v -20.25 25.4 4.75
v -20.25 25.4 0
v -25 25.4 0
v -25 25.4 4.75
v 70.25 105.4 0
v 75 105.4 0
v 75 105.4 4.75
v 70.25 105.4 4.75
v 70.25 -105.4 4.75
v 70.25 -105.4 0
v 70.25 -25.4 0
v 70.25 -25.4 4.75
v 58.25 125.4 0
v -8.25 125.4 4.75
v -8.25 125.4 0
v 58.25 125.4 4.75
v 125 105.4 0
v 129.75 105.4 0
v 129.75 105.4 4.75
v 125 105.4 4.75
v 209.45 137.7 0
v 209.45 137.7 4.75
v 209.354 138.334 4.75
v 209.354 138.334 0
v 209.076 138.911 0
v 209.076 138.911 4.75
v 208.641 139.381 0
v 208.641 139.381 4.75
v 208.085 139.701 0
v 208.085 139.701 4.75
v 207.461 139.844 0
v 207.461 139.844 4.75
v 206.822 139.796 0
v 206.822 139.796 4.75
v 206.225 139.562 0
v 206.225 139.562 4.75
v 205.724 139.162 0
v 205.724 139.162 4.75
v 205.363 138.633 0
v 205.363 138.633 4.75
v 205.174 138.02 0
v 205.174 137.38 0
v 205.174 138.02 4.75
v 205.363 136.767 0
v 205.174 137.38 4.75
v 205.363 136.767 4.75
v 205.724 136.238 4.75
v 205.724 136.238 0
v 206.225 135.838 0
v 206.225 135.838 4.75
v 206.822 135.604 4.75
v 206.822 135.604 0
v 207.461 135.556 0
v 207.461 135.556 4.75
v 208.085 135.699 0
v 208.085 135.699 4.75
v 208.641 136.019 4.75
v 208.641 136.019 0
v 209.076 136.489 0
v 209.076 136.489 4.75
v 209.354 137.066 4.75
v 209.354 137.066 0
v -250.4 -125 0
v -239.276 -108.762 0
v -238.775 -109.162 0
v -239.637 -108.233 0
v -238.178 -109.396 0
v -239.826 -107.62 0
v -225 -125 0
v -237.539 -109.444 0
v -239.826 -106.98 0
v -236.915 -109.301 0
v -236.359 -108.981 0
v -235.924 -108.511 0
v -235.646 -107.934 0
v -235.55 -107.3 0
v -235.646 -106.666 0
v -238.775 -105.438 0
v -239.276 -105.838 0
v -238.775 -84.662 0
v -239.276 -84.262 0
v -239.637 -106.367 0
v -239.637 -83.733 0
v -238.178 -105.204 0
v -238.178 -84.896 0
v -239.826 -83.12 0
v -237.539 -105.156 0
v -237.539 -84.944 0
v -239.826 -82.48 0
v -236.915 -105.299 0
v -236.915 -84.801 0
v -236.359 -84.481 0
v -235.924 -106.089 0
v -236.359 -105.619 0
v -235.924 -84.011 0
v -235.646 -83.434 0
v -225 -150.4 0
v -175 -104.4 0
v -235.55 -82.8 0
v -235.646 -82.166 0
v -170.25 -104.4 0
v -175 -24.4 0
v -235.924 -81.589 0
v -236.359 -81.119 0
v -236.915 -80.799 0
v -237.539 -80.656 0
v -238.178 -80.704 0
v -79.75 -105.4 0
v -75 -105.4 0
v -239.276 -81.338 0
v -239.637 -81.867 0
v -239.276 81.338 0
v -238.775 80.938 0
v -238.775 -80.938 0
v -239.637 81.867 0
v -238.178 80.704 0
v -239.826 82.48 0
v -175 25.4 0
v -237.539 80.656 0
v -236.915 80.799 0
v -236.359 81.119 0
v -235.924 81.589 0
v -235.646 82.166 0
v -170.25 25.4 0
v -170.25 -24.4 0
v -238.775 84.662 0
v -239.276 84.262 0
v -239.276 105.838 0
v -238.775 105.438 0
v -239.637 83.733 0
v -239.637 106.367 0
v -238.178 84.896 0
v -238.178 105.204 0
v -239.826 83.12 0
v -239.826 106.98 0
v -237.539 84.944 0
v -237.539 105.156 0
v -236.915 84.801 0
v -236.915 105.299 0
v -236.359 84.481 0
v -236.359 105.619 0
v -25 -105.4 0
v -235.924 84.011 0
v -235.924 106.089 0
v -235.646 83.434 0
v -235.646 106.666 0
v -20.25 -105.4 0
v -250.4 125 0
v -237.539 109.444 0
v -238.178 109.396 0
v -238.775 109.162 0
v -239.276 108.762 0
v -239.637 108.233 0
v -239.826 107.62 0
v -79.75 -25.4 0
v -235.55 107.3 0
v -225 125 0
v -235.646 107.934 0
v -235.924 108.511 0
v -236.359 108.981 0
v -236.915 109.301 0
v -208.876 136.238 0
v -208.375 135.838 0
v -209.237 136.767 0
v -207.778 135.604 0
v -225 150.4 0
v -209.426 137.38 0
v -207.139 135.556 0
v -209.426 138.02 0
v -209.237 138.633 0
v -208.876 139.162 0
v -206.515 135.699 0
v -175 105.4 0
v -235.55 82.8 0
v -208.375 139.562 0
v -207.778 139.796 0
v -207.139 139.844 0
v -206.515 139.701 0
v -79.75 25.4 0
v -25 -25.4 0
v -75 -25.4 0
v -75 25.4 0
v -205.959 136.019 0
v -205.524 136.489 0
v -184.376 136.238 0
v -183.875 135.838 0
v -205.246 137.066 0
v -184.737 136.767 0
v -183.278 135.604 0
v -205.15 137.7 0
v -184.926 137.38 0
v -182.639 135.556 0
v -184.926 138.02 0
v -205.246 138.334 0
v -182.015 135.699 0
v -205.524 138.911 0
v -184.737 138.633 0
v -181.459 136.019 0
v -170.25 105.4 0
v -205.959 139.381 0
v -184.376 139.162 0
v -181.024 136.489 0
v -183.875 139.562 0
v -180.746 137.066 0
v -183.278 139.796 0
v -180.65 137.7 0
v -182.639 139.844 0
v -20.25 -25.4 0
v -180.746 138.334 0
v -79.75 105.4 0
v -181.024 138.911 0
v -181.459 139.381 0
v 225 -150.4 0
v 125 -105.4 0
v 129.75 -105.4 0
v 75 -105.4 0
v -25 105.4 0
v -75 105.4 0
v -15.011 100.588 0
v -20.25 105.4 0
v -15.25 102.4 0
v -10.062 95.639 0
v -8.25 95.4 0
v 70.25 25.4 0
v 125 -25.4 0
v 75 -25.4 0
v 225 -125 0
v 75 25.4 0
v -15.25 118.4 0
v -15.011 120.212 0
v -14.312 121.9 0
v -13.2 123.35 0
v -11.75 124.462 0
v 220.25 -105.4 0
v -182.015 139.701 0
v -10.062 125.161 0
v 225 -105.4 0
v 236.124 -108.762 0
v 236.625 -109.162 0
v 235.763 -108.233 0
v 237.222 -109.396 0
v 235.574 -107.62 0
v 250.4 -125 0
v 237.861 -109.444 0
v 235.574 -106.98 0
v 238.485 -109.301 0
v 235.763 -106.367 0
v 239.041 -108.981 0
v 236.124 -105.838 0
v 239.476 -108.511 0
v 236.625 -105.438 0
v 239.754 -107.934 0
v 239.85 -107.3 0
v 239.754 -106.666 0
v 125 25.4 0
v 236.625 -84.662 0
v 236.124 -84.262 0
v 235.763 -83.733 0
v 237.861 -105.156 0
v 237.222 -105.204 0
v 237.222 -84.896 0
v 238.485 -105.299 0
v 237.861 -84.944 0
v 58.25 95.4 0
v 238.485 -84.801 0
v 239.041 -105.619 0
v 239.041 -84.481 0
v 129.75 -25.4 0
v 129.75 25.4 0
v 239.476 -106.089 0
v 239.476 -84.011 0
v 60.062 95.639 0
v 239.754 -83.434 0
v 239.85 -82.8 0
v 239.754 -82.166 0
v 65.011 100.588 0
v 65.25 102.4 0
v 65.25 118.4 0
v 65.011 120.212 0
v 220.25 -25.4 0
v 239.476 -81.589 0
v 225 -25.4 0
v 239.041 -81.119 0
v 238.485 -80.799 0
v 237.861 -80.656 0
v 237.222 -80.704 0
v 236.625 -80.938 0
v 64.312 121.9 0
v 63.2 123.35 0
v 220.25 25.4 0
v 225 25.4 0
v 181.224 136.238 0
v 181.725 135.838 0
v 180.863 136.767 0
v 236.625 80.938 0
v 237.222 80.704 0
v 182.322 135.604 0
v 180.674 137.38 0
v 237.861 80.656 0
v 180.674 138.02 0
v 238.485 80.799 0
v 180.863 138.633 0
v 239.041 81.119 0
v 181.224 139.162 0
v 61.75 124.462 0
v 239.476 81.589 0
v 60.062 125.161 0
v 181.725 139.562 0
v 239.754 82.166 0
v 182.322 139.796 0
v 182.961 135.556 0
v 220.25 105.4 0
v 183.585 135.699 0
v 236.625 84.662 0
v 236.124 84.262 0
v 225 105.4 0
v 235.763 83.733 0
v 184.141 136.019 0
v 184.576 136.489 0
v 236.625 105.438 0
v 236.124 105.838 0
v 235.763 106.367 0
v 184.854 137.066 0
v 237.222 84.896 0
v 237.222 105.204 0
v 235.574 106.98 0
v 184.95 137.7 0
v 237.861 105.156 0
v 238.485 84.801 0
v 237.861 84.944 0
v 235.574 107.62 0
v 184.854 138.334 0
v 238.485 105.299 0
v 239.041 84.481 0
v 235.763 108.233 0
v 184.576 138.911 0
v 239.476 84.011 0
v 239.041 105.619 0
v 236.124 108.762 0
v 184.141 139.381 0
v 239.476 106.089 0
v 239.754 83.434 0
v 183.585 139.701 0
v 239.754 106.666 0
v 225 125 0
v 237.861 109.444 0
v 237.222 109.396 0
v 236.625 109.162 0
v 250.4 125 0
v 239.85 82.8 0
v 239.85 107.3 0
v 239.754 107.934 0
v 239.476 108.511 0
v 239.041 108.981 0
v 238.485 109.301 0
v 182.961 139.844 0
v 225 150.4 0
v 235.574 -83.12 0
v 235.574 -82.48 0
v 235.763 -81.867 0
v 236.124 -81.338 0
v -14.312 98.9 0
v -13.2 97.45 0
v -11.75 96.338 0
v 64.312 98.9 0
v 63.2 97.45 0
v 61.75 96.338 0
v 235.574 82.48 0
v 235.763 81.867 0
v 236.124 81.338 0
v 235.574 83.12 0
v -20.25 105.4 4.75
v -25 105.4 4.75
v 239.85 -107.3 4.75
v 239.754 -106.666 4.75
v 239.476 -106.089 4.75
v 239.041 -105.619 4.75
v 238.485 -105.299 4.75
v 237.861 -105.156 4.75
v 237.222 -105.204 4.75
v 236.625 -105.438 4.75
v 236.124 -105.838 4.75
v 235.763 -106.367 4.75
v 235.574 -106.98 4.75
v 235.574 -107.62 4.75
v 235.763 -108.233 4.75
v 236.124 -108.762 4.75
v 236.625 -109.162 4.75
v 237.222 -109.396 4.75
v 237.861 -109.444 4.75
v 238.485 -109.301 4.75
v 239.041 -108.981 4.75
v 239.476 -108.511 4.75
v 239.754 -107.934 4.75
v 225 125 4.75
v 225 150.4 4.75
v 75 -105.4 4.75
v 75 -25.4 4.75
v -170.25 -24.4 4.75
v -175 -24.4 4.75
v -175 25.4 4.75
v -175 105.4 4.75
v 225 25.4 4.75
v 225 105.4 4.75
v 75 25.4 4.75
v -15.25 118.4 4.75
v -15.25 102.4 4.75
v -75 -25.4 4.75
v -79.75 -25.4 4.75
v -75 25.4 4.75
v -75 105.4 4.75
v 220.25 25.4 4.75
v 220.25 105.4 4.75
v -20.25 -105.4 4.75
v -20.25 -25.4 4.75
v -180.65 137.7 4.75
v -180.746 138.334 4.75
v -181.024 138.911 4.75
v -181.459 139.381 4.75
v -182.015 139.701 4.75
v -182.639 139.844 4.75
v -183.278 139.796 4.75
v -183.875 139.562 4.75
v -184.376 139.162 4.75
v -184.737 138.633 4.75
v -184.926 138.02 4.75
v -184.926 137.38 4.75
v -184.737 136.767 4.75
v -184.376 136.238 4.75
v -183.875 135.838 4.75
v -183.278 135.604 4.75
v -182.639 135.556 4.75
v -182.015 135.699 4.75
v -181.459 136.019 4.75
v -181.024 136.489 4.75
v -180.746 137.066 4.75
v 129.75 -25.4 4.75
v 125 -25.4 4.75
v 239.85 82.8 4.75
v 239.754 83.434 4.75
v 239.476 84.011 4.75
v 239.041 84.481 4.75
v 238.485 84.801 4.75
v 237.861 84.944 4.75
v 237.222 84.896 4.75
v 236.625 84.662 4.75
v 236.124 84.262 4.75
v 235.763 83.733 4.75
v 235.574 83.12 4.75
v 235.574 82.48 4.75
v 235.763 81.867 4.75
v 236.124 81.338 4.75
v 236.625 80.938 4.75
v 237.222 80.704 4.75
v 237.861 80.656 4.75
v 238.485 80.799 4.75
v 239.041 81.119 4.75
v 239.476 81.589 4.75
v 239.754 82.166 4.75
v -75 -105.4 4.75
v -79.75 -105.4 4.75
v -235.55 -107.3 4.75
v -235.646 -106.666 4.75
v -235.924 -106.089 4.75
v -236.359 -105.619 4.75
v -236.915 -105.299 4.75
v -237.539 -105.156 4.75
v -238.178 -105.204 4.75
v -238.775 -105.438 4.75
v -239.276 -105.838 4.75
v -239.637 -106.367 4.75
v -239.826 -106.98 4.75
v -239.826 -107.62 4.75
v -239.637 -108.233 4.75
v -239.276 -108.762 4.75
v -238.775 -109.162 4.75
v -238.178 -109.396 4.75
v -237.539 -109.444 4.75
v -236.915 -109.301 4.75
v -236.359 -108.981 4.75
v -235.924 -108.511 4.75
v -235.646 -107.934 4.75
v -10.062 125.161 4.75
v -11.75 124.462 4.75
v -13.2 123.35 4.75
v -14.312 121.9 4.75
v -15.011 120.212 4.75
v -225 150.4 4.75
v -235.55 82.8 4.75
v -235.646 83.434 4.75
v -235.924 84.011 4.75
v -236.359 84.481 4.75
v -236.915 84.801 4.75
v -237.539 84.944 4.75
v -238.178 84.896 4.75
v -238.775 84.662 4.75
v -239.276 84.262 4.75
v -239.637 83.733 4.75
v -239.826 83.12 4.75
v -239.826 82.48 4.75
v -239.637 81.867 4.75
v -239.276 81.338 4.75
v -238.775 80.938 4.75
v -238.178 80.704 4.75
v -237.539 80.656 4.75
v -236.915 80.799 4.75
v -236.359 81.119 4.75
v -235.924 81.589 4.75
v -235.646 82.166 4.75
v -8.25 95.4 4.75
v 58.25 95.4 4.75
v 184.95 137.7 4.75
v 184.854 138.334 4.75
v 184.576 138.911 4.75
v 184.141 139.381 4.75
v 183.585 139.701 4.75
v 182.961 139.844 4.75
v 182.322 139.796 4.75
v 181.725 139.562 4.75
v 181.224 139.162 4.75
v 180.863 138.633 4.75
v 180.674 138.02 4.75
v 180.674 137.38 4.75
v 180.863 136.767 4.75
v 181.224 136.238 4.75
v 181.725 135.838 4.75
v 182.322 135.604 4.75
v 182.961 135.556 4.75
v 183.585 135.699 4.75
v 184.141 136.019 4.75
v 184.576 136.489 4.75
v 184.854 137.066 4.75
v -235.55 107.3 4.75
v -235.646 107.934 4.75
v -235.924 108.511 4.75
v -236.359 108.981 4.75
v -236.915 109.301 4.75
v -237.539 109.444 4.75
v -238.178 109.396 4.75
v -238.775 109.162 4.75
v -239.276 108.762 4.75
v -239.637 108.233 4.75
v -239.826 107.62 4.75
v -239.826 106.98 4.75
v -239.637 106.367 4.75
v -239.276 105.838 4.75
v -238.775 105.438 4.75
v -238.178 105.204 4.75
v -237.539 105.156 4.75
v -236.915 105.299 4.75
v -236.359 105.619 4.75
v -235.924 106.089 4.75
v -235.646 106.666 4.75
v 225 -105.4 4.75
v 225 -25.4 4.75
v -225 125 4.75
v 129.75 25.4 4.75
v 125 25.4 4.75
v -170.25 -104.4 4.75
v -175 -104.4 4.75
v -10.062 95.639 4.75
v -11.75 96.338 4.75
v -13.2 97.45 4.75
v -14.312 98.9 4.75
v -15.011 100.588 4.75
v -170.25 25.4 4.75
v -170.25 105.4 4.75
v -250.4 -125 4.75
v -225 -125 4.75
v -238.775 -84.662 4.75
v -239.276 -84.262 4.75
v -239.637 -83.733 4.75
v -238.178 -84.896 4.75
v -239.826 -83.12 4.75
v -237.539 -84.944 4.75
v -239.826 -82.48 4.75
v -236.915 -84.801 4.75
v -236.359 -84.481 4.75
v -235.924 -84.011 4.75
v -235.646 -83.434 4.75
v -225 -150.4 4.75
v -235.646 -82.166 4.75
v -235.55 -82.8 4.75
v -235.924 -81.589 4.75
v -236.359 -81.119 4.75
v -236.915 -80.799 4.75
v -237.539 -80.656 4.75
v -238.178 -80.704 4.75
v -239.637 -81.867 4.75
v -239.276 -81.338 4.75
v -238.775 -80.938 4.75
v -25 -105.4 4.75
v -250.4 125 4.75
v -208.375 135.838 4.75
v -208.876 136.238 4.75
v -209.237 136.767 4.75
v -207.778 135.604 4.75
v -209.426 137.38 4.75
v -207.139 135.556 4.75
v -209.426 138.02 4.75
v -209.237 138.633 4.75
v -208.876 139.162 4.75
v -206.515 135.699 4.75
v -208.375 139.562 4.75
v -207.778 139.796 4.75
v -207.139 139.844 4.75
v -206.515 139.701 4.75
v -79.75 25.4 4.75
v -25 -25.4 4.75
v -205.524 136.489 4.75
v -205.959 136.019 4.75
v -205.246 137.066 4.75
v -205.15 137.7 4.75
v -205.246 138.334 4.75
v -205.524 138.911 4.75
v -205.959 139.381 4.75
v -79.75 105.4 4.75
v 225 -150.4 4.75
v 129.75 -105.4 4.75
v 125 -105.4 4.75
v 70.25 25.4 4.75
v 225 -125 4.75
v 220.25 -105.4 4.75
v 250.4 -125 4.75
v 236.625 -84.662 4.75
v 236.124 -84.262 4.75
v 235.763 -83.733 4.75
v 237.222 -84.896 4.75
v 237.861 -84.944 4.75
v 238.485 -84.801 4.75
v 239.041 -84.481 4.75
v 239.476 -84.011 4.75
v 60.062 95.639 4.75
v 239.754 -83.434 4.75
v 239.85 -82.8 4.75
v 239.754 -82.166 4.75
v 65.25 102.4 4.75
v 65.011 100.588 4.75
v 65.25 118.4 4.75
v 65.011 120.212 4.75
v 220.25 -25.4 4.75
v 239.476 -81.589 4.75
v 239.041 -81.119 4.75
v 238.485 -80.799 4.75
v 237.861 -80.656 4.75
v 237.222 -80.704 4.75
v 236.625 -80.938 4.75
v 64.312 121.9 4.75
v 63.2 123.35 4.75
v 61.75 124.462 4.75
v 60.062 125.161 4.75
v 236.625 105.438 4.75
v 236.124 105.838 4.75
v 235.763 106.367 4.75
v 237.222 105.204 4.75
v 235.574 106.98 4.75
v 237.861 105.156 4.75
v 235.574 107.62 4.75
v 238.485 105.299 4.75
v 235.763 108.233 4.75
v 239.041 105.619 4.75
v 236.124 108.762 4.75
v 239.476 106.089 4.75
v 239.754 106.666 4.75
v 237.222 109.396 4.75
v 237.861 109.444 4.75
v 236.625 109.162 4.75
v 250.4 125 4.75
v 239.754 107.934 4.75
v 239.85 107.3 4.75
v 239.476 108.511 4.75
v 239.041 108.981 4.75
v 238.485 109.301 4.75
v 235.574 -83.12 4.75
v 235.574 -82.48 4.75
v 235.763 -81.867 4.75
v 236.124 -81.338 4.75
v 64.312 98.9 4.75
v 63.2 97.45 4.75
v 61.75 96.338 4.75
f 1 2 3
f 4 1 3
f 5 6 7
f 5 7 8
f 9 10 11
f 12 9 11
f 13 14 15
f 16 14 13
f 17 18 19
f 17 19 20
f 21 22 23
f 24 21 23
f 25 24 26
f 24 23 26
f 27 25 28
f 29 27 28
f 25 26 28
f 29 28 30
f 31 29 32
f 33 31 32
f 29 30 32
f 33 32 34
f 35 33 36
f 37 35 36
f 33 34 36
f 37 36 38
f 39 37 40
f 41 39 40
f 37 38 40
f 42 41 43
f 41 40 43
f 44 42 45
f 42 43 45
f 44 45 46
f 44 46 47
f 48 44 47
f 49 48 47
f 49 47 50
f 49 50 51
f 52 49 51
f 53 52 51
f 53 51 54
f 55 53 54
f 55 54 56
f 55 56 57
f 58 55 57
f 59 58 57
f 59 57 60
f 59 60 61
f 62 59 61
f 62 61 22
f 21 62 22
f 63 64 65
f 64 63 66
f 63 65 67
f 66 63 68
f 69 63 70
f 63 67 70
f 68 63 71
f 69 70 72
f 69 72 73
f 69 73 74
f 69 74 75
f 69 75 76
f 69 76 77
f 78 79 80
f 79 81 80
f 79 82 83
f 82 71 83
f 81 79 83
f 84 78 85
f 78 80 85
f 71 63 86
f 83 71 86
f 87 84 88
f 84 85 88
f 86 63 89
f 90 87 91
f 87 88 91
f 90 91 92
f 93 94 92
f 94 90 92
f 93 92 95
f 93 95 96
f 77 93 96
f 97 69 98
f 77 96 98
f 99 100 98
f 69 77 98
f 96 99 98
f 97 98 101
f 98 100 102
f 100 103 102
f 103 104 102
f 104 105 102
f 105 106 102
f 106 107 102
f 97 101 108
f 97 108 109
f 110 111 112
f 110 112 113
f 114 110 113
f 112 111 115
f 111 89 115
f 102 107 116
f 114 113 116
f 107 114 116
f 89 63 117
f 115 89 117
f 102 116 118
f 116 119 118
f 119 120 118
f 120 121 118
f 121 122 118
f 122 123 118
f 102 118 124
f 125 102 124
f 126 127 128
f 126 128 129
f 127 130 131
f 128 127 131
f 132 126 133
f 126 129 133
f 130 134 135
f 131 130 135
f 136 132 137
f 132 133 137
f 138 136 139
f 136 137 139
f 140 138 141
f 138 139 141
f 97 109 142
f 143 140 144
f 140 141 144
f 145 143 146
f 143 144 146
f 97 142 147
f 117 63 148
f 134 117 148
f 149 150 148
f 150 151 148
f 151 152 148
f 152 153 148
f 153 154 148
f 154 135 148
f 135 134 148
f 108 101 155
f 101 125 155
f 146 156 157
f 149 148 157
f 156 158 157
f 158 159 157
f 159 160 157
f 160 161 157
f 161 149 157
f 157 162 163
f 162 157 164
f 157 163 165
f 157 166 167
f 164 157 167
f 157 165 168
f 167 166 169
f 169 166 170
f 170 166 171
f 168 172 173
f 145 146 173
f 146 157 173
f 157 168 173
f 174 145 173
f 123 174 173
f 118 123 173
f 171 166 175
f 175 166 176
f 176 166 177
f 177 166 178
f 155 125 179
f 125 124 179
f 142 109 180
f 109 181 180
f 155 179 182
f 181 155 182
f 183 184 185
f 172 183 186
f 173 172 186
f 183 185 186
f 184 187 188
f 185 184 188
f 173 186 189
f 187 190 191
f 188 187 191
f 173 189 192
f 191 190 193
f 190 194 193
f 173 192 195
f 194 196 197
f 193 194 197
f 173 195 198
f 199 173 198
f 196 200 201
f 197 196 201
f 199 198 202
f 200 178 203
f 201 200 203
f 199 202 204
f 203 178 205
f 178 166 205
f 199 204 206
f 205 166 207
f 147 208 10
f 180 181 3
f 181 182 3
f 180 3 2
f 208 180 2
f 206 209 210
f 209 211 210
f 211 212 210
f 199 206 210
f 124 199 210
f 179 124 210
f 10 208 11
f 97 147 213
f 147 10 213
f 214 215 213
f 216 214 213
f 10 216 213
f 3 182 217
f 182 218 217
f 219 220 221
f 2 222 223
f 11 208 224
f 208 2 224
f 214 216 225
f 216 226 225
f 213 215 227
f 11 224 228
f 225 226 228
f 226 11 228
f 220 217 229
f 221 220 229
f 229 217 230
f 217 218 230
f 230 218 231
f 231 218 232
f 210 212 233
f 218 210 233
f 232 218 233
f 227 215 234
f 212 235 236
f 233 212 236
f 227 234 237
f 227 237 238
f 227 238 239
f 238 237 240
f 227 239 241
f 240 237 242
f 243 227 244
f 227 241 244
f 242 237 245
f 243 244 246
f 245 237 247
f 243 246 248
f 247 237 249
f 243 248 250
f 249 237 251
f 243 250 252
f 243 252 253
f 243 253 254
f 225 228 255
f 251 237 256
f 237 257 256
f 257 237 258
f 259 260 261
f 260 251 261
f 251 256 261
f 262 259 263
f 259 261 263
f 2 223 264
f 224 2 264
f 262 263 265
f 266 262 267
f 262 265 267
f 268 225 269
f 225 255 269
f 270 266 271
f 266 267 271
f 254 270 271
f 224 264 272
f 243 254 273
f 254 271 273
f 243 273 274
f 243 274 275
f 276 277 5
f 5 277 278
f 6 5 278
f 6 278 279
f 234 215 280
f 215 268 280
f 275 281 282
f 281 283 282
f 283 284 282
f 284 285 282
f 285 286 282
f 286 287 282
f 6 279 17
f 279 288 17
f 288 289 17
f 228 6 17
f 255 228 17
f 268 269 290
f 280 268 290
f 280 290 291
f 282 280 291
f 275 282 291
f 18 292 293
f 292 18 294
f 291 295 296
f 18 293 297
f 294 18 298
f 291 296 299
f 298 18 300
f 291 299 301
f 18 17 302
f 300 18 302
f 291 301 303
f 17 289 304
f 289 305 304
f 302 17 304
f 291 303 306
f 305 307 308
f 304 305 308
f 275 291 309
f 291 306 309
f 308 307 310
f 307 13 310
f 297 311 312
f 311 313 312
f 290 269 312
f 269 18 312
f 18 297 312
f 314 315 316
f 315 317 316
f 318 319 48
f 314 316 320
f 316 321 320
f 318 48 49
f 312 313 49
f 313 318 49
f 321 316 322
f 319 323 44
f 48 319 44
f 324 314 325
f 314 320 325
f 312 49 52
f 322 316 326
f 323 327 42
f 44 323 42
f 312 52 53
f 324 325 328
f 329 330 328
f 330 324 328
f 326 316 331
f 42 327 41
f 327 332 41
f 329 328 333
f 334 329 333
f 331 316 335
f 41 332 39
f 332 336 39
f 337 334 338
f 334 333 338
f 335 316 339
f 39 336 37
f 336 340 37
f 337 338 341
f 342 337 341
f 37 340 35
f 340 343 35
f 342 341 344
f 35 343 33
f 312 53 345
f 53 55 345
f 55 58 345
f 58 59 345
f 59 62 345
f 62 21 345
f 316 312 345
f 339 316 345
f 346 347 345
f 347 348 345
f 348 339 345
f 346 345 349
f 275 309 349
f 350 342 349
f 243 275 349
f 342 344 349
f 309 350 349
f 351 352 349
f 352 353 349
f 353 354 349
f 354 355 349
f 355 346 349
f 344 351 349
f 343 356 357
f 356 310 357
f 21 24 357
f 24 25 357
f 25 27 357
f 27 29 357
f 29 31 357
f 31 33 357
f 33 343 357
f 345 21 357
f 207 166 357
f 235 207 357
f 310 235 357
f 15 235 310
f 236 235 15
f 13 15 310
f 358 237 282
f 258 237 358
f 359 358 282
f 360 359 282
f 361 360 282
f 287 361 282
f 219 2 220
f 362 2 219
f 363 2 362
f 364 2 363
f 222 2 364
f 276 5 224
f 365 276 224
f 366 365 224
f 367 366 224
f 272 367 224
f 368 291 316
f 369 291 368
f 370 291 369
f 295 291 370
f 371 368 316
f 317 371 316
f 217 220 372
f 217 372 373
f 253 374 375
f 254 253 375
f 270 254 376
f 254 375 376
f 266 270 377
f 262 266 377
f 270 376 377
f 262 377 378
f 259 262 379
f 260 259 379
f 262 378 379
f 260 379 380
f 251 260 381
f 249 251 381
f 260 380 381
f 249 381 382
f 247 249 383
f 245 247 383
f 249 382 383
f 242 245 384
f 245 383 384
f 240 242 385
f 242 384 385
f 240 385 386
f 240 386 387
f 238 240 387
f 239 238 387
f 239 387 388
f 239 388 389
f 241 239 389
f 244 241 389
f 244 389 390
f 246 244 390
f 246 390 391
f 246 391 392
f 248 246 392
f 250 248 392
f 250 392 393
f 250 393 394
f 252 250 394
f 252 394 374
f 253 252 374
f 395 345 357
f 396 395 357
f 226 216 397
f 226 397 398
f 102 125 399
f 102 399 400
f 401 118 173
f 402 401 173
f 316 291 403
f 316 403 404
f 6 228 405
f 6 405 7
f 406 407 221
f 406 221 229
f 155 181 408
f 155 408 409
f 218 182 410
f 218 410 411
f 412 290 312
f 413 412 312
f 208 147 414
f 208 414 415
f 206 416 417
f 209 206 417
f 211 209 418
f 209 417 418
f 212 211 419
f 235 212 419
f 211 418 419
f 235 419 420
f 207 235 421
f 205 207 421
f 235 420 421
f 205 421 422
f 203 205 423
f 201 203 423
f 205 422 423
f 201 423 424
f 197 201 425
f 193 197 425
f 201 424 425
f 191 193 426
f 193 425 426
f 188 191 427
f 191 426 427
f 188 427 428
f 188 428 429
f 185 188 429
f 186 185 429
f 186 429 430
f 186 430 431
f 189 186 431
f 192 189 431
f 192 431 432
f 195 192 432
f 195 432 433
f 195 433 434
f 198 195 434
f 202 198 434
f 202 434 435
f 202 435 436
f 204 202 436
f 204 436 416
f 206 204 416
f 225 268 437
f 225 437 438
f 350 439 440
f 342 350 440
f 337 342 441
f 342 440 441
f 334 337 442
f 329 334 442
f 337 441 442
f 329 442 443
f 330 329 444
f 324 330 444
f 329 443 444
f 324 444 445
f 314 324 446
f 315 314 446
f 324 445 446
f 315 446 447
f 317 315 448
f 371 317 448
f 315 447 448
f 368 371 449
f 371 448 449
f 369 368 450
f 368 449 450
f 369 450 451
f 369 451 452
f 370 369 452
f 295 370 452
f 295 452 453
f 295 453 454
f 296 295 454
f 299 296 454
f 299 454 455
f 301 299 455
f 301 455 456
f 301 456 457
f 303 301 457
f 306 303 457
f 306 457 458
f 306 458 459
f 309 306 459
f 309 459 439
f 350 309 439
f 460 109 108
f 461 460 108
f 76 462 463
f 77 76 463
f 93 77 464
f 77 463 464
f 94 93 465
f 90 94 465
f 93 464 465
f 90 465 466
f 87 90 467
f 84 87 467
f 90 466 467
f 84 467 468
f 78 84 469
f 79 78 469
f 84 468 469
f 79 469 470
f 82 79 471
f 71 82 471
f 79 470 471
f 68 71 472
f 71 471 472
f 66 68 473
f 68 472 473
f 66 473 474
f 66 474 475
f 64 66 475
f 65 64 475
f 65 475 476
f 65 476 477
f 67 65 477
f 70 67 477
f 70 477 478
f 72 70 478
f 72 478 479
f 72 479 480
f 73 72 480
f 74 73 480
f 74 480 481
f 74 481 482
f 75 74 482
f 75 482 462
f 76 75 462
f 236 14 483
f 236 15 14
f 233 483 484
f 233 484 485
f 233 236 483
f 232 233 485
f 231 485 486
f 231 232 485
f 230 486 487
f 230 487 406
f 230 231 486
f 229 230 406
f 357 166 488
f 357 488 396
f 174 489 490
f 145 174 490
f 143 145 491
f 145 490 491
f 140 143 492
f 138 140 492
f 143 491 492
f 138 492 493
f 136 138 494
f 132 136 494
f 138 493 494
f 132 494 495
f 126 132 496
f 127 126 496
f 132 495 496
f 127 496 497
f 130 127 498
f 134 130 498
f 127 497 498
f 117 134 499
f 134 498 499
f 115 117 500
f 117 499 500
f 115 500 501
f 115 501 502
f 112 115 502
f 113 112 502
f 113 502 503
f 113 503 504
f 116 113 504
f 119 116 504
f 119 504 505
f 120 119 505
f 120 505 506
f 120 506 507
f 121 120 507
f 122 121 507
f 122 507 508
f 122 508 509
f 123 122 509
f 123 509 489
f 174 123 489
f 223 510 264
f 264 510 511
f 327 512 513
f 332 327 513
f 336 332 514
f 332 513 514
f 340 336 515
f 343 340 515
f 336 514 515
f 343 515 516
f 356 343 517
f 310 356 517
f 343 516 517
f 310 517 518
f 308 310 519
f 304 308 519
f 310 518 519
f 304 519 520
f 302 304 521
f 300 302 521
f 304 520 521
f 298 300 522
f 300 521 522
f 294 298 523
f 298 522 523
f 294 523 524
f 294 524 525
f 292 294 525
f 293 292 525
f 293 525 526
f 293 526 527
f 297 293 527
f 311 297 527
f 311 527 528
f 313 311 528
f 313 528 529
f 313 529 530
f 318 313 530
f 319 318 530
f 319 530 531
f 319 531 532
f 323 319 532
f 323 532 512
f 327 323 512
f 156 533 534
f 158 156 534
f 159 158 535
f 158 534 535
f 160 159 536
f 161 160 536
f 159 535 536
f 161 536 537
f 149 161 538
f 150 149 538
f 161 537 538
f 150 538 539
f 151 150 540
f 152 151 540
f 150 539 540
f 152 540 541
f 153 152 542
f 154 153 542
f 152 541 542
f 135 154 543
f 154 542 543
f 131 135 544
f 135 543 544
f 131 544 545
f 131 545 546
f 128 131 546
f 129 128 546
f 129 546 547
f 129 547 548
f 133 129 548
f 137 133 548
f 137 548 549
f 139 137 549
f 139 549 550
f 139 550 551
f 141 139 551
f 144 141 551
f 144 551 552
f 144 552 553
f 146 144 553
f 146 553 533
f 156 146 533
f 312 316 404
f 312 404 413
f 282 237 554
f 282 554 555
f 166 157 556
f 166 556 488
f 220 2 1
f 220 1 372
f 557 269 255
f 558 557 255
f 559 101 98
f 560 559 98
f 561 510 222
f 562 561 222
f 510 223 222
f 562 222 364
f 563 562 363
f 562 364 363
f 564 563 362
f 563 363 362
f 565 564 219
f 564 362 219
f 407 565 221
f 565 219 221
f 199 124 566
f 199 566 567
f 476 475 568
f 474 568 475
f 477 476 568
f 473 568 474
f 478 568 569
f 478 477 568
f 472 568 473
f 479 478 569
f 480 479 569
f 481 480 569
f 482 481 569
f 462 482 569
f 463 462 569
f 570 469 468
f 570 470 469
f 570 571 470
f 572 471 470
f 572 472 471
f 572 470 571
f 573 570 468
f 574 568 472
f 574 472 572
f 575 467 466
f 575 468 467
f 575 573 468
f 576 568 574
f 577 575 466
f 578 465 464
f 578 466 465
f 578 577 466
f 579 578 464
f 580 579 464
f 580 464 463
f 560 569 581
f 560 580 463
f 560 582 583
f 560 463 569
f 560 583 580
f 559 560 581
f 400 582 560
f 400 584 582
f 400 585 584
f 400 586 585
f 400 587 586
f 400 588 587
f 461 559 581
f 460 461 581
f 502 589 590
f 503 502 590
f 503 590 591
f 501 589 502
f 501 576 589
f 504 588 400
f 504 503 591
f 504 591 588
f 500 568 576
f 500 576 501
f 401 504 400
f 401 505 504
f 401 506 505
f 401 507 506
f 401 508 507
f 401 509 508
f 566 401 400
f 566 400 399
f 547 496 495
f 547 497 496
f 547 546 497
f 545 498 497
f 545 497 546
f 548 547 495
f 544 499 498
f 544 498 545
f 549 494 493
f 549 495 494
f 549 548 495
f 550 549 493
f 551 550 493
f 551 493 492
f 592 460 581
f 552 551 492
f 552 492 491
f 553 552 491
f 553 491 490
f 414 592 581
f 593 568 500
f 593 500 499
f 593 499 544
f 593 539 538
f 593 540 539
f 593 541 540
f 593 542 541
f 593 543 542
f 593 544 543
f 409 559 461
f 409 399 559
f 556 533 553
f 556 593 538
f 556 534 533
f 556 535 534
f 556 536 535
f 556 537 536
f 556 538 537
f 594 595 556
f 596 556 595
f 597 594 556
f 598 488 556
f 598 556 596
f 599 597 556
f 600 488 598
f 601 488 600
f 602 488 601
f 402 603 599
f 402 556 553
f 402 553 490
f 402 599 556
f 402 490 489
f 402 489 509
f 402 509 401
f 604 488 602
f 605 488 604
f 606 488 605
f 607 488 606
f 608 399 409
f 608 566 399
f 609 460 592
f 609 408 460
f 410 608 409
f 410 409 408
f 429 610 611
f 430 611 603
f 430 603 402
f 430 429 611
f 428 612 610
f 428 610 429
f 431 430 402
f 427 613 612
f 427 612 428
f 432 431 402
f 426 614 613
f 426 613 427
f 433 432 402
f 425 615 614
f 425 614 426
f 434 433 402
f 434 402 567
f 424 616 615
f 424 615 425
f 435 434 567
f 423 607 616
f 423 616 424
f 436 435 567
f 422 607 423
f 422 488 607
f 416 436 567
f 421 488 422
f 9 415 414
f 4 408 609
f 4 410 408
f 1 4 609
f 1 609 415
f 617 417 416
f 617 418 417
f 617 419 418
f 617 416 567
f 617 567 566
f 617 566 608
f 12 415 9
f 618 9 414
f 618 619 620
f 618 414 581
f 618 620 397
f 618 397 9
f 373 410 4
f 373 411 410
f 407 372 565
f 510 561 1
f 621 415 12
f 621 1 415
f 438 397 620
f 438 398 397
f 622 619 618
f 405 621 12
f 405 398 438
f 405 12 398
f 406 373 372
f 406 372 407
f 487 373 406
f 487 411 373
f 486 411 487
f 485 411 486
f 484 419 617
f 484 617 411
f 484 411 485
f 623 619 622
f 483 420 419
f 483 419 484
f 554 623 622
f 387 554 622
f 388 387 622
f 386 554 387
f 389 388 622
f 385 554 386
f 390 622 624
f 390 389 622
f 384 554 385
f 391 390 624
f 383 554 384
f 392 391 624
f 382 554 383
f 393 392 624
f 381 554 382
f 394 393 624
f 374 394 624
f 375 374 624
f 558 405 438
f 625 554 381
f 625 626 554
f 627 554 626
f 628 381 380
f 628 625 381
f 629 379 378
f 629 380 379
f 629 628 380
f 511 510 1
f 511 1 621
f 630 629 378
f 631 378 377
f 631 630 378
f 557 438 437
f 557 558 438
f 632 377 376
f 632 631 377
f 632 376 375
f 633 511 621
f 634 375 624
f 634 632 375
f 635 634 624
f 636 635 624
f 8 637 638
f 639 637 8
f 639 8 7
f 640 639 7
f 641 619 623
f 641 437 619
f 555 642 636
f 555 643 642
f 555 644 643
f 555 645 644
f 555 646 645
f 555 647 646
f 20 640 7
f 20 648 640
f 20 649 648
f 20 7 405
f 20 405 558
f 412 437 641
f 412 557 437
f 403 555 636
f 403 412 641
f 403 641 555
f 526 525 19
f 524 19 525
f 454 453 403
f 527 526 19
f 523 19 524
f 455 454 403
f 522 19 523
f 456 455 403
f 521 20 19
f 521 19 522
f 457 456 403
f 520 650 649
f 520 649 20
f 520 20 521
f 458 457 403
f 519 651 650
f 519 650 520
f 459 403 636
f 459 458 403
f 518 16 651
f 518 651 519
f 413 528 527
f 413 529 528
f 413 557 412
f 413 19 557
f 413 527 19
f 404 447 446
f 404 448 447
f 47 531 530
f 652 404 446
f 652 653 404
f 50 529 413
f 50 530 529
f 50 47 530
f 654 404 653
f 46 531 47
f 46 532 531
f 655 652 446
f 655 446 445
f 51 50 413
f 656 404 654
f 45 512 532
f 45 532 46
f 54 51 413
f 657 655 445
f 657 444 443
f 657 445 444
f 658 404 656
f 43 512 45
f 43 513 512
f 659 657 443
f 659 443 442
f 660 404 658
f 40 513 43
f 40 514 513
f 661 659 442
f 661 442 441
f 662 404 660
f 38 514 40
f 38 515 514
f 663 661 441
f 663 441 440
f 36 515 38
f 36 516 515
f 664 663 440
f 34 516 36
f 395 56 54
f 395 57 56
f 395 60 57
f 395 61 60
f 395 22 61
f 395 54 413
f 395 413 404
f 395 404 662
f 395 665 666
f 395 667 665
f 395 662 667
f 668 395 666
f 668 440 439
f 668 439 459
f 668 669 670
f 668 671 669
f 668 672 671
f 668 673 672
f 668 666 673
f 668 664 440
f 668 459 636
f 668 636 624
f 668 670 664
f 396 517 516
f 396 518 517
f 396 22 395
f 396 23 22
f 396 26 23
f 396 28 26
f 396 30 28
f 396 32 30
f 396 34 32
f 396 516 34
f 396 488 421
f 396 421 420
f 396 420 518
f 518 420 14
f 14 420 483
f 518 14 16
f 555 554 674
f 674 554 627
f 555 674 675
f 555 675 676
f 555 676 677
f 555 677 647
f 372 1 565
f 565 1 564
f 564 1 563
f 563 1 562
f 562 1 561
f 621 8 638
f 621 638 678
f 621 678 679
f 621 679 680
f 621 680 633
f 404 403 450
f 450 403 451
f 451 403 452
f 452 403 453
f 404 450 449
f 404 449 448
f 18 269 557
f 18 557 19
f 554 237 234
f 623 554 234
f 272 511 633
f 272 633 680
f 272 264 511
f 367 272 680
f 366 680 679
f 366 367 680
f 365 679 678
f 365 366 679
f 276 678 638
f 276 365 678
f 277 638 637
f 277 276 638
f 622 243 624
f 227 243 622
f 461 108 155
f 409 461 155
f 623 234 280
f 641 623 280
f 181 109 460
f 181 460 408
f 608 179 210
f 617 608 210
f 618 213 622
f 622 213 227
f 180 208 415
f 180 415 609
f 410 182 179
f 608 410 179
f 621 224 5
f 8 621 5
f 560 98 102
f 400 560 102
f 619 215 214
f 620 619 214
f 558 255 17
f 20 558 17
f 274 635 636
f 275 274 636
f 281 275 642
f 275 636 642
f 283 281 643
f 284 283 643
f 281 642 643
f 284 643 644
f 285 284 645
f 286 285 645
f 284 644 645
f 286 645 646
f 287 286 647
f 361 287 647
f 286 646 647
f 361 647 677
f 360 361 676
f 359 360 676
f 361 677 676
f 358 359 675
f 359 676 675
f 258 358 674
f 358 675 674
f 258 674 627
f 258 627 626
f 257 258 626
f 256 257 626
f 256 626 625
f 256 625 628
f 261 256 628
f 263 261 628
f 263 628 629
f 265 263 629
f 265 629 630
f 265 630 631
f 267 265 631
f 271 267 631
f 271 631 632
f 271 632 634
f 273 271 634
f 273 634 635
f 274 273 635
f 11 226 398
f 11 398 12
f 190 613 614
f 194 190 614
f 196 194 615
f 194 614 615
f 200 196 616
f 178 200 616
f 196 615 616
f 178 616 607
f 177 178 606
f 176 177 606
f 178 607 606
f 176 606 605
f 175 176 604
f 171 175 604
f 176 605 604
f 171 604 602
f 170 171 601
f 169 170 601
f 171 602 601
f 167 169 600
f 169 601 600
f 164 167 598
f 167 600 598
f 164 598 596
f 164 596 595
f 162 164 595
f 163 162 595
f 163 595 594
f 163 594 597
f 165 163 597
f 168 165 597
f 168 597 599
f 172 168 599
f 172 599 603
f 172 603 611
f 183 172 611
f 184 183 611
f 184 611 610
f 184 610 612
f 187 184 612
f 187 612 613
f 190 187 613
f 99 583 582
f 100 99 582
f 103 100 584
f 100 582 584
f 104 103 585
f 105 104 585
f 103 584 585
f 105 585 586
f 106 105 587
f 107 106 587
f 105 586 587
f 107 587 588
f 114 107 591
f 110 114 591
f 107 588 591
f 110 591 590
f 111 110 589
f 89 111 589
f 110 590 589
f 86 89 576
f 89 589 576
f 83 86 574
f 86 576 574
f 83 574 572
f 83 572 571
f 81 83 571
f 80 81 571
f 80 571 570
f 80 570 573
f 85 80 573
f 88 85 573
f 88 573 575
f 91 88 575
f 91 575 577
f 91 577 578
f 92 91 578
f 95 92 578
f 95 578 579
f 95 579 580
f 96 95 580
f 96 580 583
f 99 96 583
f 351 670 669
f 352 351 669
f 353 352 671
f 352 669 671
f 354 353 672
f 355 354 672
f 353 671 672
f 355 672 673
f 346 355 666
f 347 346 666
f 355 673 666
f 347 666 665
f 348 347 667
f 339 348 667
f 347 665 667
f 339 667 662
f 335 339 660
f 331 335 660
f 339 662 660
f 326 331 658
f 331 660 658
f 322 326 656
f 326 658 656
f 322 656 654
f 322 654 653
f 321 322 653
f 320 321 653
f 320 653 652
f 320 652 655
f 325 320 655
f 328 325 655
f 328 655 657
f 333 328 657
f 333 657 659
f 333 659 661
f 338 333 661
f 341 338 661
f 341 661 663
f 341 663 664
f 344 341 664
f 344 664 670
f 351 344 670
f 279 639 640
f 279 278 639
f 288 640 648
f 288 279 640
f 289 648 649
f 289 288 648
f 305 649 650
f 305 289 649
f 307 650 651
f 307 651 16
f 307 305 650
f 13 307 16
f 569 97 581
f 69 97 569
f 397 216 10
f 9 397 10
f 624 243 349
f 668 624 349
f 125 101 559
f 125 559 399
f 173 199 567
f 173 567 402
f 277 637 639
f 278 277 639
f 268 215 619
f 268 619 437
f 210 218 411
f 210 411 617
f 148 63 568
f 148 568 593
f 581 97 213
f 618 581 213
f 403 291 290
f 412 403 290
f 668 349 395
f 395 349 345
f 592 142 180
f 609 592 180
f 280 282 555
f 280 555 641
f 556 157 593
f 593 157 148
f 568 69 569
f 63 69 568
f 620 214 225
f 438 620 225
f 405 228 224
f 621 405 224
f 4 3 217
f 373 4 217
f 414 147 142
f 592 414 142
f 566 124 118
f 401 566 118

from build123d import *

# Parameters (mm, degrees)
SKETCH_1_W          = 500.8
SKETCH_1_H          = 300.8
EXTRUDE_1_DEPTH     = 4.75
SKETCH_2_W          = 25.4
SKETCH_2_H          = 25.4
SKETCH_2_W_2        = 4.75
SKETCH_2_H_2        = 80
CUT_EXTRUDE_1_DEPTH = 10
SKETCH_3_R          = 2.150000004
SKETCH_3_R_2        = 2.15
CUT_EXTRUDE_2_DEPTH = 5
SKETCH_4_W          = 80.5
SKETCH_4_H          = 30
CUT_EXTRUDE_3_DEPTH = 4.75
FILLET_1_R          = 7


with BuildPart() as part:
    # 草圖1 → 填料-伸長1 (new body)
    with BuildSketch(Plane.XY):
        Rectangle(SKETCH_1_W, SKETCH_1_H)
    extrude(amount=EXTRUDE_1_DEPTH)

    # 草圖2 → 除料-伸長1 (cut)
    with BuildSketch(Plane(origin=(0, 0, 0), x_dir=(-1, 0, 0), z_dir=(0, 0, -1))):
        with Locations((-237.7, 137.7)):
            Rectangle(SKETCH_2_W, SKETCH_2_H)
        with Locations((-237.7, -137.7)):
            Rectangle(SKETCH_2_W, SKETCH_2_H)
        with Locations((237.7, 137.7)):
            Rectangle(SKETCH_2_W, SKETCH_2_H)
        with Locations((237.7, -137.7)):
            Rectangle(SKETCH_2_W, SKETCH_2_H)
        with Locations((-222.625, 65.4)):
            Rectangle(SKETCH_2_W_2, SKETCH_2_H_2)
        with Locations((-222.625, -65.4)):
            Rectangle(SKETCH_2_W_2, SKETCH_2_H_2)
        with Locations((172.625, 65.4)):
            Rectangle(SKETCH_2_W_2, SKETCH_2_H_2)
        with Locations((172.625, -64.4)):
            Rectangle(SKETCH_2_W_2, SKETCH_2_H_2)
        with Locations((-127.375, 65.4)):
            Rectangle(SKETCH_2_W_2, SKETCH_2_H_2)
        with Locations((-72.625, 65.4)):
            Rectangle(SKETCH_2_W_2, SKETCH_2_H_2)
        with Locations((22.625, 65.4)):
            Rectangle(SKETCH_2_W_2, SKETCH_2_H_2)
        with Locations((77.375, 65.4)):
            Rectangle(SKETCH_2_W_2, SKETCH_2_H_2)
        with Locations((77.375, -65.4)):
            Rectangle(SKETCH_2_W_2, SKETCH_2_H_2)
        with Locations((22.625, -65.4)):
            Rectangle(SKETCH_2_W_2, SKETCH_2_H_2)
        with Locations((-127.375, -65.4)):
            Rectangle(SKETCH_2_W_2, SKETCH_2_H_2)
        with Locations((-72.625, -65.4)):
            Rectangle(SKETCH_2_W_2, SKETCH_2_H_2)
    extrude(amount=-CUT_EXTRUDE_1_DEPTH, mode=Mode.SUBTRACT)

    # 草圖3 → 除料-伸長2 (cut)
    with BuildSketch(Plane.XY.offset(4.75)):
        with Locations((-237.7, 107.300000013)):
            Circle(SKETCH_3_R)
        with Locations((-237.7, 82.800000013)):
            Circle(SKETCH_3_R)
        with Locations((-207.3, 137.700000006)):
            Circle(SKETCH_3_R_2)
        with Locations((-182.8, 137.700000006)):
            Circle(SKETCH_3_R_2)
        with Locations((-237.7, -82.800000001)):
            Circle(SKETCH_3_R_2)
        with Locations((-237.7, -107.300000001)):
            Circle(SKETCH_3_R_2)
        with Locations((237.7, -107.300000007)):
            Circle(SKETCH_3_R)
        with Locations((237.7, -82.800000007)):
            Circle(SKETCH_3_R)
        with Locations((237.7, 107.300000006)):
            Circle(SKETCH_3_R_2)
        with Locations((237.7, 82.800000006)):
            Circle(SKETCH_3_R_2)
        with Locations((182.8, 137.700000006)):
            Circle(SKETCH_3_R_2)
        with Locations((207.3, 137.700000006)):
            Circle(SKETCH_3_R_2)
    extrude(amount=-CUT_EXTRUDE_2_DEPTH, mode=Mode.SUBTRACT)

    # 草圖4 → 除料-伸長3 (cut)
    with BuildSketch(Plane.XY.offset(4.75)):
        with Locations((25, 110.4)):
            Rectangle(SKETCH_4_W, SKETCH_4_H)
    extrude(amount=-CUT_EXTRUDE_3_DEPTH, mode=Mode.SUBTRACT)

    # 圓角1
    fillet_1_edges = [part.edges().sort_by_distance(p)[0] for p in [
        (65.25, 125.4, 2.375),
        (65.25, 95.4, 2.375),
        (-15.25, 95.4, 2.375),
        (-15.25, 125.4, 2.375),
    ]]
    fillet(fillet_1_edges, radius=FILLET_1_R)


solid = part.part
